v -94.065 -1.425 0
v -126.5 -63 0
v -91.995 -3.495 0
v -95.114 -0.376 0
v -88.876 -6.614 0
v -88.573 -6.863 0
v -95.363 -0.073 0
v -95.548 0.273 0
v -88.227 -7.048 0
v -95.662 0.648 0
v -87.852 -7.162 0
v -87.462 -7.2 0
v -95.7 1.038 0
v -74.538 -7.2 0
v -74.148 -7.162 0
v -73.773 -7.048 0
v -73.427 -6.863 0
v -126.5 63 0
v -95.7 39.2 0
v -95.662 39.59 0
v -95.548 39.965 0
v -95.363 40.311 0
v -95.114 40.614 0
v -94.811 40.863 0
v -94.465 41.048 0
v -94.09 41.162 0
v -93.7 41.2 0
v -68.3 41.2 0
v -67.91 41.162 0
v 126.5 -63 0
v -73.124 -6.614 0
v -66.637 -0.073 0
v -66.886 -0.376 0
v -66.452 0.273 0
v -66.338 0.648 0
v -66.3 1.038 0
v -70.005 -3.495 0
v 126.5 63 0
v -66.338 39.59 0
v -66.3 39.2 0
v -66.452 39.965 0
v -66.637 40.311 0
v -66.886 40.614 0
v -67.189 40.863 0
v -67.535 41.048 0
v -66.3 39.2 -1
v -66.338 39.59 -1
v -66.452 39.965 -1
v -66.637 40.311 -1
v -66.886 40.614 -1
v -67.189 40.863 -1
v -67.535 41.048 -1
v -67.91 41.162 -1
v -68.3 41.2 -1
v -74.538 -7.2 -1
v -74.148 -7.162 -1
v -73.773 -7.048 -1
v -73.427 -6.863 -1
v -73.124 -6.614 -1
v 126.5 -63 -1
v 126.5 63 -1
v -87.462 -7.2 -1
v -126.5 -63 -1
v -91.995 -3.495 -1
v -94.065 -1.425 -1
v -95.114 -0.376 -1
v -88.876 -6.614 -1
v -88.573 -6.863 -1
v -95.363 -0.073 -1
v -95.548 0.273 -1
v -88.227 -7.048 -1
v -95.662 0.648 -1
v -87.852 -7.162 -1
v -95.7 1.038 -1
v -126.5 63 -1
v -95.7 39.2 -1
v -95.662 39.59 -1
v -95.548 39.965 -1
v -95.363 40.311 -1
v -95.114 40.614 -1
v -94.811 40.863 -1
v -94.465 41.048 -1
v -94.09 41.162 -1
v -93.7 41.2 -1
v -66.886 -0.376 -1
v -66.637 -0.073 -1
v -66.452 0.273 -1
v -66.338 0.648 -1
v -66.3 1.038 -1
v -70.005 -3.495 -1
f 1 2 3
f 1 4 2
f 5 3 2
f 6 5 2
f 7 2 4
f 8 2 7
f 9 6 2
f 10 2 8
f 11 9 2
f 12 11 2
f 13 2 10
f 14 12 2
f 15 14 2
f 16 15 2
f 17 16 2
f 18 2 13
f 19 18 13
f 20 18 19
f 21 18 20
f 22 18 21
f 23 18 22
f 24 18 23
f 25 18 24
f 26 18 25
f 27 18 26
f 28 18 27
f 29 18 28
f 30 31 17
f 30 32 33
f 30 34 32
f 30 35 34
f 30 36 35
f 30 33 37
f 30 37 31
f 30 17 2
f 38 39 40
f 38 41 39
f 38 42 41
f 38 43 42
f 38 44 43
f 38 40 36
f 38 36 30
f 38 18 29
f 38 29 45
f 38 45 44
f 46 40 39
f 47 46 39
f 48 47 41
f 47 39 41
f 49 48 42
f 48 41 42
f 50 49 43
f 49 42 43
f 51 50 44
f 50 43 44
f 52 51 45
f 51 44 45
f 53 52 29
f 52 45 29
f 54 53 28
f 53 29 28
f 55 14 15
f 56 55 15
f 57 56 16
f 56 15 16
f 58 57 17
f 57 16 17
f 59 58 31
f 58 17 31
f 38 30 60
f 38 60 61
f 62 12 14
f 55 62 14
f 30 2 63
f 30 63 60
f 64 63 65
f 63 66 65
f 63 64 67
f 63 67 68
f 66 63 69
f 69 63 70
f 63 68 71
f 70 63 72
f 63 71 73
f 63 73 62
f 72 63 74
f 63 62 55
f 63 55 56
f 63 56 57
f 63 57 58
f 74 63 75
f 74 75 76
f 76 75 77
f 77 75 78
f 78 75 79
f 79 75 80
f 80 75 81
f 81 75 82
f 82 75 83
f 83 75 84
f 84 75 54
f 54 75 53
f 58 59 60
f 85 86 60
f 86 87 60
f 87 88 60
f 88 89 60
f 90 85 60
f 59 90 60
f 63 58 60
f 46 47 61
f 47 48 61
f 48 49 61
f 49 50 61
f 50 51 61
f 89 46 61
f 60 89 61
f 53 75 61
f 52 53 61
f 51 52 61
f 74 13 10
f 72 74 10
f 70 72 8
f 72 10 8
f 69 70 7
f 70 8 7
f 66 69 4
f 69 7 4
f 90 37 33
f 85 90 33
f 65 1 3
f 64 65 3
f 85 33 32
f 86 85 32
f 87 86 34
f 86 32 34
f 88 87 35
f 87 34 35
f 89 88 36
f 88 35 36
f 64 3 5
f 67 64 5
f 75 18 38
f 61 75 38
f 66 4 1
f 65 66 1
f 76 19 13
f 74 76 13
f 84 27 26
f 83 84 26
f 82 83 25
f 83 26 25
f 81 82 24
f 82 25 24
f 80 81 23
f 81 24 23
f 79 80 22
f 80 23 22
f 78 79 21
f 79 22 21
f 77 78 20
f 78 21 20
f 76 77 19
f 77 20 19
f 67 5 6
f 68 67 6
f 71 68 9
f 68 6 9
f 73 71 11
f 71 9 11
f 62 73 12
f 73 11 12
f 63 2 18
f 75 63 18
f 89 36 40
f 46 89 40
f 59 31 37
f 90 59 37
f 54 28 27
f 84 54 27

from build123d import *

# Parameters (mm, degrees)
SKETCH1_W          = 253
SKETCH1_H          = 126
BASE_FLANGE1_DEPTH = 1


# Sheet-metal steps are written as plain solids
with BuildPart() as part:
    # Sketch1 → Base-Flange1 (new body)
    with BuildSketch(Plane.XY):
        Rectangle(SKETCH1_W, SKETCH1_H)
        with BuildLine():
            Line((-81, -7.2), (-74.538477631, -7.2))
            ThreePointArc((-74.538477631, -7.2), (-73.773110766, -7.047759065), (-73.124264069, -6.614213562))
            Line((-73.124264069, -6.614213562), (-70.005025253, -3.494974747))
            Line((-70.005025253, -3.494974747), (-66.885786438, -0.375735931))
            ThreePointArc((-66.885786438, -0.375735931), (-66.452240935, 0.273110766), (-66.3, 1.038477631))
            Line((-66.3, 1.038477631), (-66.3, 39.2))
            ThreePointArc((-66.3, 39.2), (-66.885786438, 40.614213562), (-68.3, 41.2))
            Line((-68.3, 41.2), (-93.7, 41.2))
            ThreePointArc((-93.7, 41.2), (-95.114213562, 40.614213562), (-95.7, 39.2))
            Line((-95.7, 39.2), (-95.7, 19.75))
            Line((-95.7, 19.75), (-95.7, 1.038477631))
            ThreePointArc((-95.7, 1.038477631), (-95.547759065, 0.273110766), (-95.114213562, -0.375735931))
            Line((-95.114213562, -0.375735931), (-94.064941978, -1.425007515))
            Line((-94.064941978, -1.425007515), (-91.994974747, -3.494974747))
            Line((-91.994974747, -3.494974747), (-88.875735931, -6.614213562))
            ThreePointArc((-88.875735931, -6.614213562), (-88.226889234, -7.047759065), (-87.461522369, -7.2))
            Line((-87.461522369, -7.2), (-81, -7.2))
        make_face(mode=Mode.SUBTRACT)
    extrude(amount=-BASE_FLANGE1_DEPTH)


solid = part.part
